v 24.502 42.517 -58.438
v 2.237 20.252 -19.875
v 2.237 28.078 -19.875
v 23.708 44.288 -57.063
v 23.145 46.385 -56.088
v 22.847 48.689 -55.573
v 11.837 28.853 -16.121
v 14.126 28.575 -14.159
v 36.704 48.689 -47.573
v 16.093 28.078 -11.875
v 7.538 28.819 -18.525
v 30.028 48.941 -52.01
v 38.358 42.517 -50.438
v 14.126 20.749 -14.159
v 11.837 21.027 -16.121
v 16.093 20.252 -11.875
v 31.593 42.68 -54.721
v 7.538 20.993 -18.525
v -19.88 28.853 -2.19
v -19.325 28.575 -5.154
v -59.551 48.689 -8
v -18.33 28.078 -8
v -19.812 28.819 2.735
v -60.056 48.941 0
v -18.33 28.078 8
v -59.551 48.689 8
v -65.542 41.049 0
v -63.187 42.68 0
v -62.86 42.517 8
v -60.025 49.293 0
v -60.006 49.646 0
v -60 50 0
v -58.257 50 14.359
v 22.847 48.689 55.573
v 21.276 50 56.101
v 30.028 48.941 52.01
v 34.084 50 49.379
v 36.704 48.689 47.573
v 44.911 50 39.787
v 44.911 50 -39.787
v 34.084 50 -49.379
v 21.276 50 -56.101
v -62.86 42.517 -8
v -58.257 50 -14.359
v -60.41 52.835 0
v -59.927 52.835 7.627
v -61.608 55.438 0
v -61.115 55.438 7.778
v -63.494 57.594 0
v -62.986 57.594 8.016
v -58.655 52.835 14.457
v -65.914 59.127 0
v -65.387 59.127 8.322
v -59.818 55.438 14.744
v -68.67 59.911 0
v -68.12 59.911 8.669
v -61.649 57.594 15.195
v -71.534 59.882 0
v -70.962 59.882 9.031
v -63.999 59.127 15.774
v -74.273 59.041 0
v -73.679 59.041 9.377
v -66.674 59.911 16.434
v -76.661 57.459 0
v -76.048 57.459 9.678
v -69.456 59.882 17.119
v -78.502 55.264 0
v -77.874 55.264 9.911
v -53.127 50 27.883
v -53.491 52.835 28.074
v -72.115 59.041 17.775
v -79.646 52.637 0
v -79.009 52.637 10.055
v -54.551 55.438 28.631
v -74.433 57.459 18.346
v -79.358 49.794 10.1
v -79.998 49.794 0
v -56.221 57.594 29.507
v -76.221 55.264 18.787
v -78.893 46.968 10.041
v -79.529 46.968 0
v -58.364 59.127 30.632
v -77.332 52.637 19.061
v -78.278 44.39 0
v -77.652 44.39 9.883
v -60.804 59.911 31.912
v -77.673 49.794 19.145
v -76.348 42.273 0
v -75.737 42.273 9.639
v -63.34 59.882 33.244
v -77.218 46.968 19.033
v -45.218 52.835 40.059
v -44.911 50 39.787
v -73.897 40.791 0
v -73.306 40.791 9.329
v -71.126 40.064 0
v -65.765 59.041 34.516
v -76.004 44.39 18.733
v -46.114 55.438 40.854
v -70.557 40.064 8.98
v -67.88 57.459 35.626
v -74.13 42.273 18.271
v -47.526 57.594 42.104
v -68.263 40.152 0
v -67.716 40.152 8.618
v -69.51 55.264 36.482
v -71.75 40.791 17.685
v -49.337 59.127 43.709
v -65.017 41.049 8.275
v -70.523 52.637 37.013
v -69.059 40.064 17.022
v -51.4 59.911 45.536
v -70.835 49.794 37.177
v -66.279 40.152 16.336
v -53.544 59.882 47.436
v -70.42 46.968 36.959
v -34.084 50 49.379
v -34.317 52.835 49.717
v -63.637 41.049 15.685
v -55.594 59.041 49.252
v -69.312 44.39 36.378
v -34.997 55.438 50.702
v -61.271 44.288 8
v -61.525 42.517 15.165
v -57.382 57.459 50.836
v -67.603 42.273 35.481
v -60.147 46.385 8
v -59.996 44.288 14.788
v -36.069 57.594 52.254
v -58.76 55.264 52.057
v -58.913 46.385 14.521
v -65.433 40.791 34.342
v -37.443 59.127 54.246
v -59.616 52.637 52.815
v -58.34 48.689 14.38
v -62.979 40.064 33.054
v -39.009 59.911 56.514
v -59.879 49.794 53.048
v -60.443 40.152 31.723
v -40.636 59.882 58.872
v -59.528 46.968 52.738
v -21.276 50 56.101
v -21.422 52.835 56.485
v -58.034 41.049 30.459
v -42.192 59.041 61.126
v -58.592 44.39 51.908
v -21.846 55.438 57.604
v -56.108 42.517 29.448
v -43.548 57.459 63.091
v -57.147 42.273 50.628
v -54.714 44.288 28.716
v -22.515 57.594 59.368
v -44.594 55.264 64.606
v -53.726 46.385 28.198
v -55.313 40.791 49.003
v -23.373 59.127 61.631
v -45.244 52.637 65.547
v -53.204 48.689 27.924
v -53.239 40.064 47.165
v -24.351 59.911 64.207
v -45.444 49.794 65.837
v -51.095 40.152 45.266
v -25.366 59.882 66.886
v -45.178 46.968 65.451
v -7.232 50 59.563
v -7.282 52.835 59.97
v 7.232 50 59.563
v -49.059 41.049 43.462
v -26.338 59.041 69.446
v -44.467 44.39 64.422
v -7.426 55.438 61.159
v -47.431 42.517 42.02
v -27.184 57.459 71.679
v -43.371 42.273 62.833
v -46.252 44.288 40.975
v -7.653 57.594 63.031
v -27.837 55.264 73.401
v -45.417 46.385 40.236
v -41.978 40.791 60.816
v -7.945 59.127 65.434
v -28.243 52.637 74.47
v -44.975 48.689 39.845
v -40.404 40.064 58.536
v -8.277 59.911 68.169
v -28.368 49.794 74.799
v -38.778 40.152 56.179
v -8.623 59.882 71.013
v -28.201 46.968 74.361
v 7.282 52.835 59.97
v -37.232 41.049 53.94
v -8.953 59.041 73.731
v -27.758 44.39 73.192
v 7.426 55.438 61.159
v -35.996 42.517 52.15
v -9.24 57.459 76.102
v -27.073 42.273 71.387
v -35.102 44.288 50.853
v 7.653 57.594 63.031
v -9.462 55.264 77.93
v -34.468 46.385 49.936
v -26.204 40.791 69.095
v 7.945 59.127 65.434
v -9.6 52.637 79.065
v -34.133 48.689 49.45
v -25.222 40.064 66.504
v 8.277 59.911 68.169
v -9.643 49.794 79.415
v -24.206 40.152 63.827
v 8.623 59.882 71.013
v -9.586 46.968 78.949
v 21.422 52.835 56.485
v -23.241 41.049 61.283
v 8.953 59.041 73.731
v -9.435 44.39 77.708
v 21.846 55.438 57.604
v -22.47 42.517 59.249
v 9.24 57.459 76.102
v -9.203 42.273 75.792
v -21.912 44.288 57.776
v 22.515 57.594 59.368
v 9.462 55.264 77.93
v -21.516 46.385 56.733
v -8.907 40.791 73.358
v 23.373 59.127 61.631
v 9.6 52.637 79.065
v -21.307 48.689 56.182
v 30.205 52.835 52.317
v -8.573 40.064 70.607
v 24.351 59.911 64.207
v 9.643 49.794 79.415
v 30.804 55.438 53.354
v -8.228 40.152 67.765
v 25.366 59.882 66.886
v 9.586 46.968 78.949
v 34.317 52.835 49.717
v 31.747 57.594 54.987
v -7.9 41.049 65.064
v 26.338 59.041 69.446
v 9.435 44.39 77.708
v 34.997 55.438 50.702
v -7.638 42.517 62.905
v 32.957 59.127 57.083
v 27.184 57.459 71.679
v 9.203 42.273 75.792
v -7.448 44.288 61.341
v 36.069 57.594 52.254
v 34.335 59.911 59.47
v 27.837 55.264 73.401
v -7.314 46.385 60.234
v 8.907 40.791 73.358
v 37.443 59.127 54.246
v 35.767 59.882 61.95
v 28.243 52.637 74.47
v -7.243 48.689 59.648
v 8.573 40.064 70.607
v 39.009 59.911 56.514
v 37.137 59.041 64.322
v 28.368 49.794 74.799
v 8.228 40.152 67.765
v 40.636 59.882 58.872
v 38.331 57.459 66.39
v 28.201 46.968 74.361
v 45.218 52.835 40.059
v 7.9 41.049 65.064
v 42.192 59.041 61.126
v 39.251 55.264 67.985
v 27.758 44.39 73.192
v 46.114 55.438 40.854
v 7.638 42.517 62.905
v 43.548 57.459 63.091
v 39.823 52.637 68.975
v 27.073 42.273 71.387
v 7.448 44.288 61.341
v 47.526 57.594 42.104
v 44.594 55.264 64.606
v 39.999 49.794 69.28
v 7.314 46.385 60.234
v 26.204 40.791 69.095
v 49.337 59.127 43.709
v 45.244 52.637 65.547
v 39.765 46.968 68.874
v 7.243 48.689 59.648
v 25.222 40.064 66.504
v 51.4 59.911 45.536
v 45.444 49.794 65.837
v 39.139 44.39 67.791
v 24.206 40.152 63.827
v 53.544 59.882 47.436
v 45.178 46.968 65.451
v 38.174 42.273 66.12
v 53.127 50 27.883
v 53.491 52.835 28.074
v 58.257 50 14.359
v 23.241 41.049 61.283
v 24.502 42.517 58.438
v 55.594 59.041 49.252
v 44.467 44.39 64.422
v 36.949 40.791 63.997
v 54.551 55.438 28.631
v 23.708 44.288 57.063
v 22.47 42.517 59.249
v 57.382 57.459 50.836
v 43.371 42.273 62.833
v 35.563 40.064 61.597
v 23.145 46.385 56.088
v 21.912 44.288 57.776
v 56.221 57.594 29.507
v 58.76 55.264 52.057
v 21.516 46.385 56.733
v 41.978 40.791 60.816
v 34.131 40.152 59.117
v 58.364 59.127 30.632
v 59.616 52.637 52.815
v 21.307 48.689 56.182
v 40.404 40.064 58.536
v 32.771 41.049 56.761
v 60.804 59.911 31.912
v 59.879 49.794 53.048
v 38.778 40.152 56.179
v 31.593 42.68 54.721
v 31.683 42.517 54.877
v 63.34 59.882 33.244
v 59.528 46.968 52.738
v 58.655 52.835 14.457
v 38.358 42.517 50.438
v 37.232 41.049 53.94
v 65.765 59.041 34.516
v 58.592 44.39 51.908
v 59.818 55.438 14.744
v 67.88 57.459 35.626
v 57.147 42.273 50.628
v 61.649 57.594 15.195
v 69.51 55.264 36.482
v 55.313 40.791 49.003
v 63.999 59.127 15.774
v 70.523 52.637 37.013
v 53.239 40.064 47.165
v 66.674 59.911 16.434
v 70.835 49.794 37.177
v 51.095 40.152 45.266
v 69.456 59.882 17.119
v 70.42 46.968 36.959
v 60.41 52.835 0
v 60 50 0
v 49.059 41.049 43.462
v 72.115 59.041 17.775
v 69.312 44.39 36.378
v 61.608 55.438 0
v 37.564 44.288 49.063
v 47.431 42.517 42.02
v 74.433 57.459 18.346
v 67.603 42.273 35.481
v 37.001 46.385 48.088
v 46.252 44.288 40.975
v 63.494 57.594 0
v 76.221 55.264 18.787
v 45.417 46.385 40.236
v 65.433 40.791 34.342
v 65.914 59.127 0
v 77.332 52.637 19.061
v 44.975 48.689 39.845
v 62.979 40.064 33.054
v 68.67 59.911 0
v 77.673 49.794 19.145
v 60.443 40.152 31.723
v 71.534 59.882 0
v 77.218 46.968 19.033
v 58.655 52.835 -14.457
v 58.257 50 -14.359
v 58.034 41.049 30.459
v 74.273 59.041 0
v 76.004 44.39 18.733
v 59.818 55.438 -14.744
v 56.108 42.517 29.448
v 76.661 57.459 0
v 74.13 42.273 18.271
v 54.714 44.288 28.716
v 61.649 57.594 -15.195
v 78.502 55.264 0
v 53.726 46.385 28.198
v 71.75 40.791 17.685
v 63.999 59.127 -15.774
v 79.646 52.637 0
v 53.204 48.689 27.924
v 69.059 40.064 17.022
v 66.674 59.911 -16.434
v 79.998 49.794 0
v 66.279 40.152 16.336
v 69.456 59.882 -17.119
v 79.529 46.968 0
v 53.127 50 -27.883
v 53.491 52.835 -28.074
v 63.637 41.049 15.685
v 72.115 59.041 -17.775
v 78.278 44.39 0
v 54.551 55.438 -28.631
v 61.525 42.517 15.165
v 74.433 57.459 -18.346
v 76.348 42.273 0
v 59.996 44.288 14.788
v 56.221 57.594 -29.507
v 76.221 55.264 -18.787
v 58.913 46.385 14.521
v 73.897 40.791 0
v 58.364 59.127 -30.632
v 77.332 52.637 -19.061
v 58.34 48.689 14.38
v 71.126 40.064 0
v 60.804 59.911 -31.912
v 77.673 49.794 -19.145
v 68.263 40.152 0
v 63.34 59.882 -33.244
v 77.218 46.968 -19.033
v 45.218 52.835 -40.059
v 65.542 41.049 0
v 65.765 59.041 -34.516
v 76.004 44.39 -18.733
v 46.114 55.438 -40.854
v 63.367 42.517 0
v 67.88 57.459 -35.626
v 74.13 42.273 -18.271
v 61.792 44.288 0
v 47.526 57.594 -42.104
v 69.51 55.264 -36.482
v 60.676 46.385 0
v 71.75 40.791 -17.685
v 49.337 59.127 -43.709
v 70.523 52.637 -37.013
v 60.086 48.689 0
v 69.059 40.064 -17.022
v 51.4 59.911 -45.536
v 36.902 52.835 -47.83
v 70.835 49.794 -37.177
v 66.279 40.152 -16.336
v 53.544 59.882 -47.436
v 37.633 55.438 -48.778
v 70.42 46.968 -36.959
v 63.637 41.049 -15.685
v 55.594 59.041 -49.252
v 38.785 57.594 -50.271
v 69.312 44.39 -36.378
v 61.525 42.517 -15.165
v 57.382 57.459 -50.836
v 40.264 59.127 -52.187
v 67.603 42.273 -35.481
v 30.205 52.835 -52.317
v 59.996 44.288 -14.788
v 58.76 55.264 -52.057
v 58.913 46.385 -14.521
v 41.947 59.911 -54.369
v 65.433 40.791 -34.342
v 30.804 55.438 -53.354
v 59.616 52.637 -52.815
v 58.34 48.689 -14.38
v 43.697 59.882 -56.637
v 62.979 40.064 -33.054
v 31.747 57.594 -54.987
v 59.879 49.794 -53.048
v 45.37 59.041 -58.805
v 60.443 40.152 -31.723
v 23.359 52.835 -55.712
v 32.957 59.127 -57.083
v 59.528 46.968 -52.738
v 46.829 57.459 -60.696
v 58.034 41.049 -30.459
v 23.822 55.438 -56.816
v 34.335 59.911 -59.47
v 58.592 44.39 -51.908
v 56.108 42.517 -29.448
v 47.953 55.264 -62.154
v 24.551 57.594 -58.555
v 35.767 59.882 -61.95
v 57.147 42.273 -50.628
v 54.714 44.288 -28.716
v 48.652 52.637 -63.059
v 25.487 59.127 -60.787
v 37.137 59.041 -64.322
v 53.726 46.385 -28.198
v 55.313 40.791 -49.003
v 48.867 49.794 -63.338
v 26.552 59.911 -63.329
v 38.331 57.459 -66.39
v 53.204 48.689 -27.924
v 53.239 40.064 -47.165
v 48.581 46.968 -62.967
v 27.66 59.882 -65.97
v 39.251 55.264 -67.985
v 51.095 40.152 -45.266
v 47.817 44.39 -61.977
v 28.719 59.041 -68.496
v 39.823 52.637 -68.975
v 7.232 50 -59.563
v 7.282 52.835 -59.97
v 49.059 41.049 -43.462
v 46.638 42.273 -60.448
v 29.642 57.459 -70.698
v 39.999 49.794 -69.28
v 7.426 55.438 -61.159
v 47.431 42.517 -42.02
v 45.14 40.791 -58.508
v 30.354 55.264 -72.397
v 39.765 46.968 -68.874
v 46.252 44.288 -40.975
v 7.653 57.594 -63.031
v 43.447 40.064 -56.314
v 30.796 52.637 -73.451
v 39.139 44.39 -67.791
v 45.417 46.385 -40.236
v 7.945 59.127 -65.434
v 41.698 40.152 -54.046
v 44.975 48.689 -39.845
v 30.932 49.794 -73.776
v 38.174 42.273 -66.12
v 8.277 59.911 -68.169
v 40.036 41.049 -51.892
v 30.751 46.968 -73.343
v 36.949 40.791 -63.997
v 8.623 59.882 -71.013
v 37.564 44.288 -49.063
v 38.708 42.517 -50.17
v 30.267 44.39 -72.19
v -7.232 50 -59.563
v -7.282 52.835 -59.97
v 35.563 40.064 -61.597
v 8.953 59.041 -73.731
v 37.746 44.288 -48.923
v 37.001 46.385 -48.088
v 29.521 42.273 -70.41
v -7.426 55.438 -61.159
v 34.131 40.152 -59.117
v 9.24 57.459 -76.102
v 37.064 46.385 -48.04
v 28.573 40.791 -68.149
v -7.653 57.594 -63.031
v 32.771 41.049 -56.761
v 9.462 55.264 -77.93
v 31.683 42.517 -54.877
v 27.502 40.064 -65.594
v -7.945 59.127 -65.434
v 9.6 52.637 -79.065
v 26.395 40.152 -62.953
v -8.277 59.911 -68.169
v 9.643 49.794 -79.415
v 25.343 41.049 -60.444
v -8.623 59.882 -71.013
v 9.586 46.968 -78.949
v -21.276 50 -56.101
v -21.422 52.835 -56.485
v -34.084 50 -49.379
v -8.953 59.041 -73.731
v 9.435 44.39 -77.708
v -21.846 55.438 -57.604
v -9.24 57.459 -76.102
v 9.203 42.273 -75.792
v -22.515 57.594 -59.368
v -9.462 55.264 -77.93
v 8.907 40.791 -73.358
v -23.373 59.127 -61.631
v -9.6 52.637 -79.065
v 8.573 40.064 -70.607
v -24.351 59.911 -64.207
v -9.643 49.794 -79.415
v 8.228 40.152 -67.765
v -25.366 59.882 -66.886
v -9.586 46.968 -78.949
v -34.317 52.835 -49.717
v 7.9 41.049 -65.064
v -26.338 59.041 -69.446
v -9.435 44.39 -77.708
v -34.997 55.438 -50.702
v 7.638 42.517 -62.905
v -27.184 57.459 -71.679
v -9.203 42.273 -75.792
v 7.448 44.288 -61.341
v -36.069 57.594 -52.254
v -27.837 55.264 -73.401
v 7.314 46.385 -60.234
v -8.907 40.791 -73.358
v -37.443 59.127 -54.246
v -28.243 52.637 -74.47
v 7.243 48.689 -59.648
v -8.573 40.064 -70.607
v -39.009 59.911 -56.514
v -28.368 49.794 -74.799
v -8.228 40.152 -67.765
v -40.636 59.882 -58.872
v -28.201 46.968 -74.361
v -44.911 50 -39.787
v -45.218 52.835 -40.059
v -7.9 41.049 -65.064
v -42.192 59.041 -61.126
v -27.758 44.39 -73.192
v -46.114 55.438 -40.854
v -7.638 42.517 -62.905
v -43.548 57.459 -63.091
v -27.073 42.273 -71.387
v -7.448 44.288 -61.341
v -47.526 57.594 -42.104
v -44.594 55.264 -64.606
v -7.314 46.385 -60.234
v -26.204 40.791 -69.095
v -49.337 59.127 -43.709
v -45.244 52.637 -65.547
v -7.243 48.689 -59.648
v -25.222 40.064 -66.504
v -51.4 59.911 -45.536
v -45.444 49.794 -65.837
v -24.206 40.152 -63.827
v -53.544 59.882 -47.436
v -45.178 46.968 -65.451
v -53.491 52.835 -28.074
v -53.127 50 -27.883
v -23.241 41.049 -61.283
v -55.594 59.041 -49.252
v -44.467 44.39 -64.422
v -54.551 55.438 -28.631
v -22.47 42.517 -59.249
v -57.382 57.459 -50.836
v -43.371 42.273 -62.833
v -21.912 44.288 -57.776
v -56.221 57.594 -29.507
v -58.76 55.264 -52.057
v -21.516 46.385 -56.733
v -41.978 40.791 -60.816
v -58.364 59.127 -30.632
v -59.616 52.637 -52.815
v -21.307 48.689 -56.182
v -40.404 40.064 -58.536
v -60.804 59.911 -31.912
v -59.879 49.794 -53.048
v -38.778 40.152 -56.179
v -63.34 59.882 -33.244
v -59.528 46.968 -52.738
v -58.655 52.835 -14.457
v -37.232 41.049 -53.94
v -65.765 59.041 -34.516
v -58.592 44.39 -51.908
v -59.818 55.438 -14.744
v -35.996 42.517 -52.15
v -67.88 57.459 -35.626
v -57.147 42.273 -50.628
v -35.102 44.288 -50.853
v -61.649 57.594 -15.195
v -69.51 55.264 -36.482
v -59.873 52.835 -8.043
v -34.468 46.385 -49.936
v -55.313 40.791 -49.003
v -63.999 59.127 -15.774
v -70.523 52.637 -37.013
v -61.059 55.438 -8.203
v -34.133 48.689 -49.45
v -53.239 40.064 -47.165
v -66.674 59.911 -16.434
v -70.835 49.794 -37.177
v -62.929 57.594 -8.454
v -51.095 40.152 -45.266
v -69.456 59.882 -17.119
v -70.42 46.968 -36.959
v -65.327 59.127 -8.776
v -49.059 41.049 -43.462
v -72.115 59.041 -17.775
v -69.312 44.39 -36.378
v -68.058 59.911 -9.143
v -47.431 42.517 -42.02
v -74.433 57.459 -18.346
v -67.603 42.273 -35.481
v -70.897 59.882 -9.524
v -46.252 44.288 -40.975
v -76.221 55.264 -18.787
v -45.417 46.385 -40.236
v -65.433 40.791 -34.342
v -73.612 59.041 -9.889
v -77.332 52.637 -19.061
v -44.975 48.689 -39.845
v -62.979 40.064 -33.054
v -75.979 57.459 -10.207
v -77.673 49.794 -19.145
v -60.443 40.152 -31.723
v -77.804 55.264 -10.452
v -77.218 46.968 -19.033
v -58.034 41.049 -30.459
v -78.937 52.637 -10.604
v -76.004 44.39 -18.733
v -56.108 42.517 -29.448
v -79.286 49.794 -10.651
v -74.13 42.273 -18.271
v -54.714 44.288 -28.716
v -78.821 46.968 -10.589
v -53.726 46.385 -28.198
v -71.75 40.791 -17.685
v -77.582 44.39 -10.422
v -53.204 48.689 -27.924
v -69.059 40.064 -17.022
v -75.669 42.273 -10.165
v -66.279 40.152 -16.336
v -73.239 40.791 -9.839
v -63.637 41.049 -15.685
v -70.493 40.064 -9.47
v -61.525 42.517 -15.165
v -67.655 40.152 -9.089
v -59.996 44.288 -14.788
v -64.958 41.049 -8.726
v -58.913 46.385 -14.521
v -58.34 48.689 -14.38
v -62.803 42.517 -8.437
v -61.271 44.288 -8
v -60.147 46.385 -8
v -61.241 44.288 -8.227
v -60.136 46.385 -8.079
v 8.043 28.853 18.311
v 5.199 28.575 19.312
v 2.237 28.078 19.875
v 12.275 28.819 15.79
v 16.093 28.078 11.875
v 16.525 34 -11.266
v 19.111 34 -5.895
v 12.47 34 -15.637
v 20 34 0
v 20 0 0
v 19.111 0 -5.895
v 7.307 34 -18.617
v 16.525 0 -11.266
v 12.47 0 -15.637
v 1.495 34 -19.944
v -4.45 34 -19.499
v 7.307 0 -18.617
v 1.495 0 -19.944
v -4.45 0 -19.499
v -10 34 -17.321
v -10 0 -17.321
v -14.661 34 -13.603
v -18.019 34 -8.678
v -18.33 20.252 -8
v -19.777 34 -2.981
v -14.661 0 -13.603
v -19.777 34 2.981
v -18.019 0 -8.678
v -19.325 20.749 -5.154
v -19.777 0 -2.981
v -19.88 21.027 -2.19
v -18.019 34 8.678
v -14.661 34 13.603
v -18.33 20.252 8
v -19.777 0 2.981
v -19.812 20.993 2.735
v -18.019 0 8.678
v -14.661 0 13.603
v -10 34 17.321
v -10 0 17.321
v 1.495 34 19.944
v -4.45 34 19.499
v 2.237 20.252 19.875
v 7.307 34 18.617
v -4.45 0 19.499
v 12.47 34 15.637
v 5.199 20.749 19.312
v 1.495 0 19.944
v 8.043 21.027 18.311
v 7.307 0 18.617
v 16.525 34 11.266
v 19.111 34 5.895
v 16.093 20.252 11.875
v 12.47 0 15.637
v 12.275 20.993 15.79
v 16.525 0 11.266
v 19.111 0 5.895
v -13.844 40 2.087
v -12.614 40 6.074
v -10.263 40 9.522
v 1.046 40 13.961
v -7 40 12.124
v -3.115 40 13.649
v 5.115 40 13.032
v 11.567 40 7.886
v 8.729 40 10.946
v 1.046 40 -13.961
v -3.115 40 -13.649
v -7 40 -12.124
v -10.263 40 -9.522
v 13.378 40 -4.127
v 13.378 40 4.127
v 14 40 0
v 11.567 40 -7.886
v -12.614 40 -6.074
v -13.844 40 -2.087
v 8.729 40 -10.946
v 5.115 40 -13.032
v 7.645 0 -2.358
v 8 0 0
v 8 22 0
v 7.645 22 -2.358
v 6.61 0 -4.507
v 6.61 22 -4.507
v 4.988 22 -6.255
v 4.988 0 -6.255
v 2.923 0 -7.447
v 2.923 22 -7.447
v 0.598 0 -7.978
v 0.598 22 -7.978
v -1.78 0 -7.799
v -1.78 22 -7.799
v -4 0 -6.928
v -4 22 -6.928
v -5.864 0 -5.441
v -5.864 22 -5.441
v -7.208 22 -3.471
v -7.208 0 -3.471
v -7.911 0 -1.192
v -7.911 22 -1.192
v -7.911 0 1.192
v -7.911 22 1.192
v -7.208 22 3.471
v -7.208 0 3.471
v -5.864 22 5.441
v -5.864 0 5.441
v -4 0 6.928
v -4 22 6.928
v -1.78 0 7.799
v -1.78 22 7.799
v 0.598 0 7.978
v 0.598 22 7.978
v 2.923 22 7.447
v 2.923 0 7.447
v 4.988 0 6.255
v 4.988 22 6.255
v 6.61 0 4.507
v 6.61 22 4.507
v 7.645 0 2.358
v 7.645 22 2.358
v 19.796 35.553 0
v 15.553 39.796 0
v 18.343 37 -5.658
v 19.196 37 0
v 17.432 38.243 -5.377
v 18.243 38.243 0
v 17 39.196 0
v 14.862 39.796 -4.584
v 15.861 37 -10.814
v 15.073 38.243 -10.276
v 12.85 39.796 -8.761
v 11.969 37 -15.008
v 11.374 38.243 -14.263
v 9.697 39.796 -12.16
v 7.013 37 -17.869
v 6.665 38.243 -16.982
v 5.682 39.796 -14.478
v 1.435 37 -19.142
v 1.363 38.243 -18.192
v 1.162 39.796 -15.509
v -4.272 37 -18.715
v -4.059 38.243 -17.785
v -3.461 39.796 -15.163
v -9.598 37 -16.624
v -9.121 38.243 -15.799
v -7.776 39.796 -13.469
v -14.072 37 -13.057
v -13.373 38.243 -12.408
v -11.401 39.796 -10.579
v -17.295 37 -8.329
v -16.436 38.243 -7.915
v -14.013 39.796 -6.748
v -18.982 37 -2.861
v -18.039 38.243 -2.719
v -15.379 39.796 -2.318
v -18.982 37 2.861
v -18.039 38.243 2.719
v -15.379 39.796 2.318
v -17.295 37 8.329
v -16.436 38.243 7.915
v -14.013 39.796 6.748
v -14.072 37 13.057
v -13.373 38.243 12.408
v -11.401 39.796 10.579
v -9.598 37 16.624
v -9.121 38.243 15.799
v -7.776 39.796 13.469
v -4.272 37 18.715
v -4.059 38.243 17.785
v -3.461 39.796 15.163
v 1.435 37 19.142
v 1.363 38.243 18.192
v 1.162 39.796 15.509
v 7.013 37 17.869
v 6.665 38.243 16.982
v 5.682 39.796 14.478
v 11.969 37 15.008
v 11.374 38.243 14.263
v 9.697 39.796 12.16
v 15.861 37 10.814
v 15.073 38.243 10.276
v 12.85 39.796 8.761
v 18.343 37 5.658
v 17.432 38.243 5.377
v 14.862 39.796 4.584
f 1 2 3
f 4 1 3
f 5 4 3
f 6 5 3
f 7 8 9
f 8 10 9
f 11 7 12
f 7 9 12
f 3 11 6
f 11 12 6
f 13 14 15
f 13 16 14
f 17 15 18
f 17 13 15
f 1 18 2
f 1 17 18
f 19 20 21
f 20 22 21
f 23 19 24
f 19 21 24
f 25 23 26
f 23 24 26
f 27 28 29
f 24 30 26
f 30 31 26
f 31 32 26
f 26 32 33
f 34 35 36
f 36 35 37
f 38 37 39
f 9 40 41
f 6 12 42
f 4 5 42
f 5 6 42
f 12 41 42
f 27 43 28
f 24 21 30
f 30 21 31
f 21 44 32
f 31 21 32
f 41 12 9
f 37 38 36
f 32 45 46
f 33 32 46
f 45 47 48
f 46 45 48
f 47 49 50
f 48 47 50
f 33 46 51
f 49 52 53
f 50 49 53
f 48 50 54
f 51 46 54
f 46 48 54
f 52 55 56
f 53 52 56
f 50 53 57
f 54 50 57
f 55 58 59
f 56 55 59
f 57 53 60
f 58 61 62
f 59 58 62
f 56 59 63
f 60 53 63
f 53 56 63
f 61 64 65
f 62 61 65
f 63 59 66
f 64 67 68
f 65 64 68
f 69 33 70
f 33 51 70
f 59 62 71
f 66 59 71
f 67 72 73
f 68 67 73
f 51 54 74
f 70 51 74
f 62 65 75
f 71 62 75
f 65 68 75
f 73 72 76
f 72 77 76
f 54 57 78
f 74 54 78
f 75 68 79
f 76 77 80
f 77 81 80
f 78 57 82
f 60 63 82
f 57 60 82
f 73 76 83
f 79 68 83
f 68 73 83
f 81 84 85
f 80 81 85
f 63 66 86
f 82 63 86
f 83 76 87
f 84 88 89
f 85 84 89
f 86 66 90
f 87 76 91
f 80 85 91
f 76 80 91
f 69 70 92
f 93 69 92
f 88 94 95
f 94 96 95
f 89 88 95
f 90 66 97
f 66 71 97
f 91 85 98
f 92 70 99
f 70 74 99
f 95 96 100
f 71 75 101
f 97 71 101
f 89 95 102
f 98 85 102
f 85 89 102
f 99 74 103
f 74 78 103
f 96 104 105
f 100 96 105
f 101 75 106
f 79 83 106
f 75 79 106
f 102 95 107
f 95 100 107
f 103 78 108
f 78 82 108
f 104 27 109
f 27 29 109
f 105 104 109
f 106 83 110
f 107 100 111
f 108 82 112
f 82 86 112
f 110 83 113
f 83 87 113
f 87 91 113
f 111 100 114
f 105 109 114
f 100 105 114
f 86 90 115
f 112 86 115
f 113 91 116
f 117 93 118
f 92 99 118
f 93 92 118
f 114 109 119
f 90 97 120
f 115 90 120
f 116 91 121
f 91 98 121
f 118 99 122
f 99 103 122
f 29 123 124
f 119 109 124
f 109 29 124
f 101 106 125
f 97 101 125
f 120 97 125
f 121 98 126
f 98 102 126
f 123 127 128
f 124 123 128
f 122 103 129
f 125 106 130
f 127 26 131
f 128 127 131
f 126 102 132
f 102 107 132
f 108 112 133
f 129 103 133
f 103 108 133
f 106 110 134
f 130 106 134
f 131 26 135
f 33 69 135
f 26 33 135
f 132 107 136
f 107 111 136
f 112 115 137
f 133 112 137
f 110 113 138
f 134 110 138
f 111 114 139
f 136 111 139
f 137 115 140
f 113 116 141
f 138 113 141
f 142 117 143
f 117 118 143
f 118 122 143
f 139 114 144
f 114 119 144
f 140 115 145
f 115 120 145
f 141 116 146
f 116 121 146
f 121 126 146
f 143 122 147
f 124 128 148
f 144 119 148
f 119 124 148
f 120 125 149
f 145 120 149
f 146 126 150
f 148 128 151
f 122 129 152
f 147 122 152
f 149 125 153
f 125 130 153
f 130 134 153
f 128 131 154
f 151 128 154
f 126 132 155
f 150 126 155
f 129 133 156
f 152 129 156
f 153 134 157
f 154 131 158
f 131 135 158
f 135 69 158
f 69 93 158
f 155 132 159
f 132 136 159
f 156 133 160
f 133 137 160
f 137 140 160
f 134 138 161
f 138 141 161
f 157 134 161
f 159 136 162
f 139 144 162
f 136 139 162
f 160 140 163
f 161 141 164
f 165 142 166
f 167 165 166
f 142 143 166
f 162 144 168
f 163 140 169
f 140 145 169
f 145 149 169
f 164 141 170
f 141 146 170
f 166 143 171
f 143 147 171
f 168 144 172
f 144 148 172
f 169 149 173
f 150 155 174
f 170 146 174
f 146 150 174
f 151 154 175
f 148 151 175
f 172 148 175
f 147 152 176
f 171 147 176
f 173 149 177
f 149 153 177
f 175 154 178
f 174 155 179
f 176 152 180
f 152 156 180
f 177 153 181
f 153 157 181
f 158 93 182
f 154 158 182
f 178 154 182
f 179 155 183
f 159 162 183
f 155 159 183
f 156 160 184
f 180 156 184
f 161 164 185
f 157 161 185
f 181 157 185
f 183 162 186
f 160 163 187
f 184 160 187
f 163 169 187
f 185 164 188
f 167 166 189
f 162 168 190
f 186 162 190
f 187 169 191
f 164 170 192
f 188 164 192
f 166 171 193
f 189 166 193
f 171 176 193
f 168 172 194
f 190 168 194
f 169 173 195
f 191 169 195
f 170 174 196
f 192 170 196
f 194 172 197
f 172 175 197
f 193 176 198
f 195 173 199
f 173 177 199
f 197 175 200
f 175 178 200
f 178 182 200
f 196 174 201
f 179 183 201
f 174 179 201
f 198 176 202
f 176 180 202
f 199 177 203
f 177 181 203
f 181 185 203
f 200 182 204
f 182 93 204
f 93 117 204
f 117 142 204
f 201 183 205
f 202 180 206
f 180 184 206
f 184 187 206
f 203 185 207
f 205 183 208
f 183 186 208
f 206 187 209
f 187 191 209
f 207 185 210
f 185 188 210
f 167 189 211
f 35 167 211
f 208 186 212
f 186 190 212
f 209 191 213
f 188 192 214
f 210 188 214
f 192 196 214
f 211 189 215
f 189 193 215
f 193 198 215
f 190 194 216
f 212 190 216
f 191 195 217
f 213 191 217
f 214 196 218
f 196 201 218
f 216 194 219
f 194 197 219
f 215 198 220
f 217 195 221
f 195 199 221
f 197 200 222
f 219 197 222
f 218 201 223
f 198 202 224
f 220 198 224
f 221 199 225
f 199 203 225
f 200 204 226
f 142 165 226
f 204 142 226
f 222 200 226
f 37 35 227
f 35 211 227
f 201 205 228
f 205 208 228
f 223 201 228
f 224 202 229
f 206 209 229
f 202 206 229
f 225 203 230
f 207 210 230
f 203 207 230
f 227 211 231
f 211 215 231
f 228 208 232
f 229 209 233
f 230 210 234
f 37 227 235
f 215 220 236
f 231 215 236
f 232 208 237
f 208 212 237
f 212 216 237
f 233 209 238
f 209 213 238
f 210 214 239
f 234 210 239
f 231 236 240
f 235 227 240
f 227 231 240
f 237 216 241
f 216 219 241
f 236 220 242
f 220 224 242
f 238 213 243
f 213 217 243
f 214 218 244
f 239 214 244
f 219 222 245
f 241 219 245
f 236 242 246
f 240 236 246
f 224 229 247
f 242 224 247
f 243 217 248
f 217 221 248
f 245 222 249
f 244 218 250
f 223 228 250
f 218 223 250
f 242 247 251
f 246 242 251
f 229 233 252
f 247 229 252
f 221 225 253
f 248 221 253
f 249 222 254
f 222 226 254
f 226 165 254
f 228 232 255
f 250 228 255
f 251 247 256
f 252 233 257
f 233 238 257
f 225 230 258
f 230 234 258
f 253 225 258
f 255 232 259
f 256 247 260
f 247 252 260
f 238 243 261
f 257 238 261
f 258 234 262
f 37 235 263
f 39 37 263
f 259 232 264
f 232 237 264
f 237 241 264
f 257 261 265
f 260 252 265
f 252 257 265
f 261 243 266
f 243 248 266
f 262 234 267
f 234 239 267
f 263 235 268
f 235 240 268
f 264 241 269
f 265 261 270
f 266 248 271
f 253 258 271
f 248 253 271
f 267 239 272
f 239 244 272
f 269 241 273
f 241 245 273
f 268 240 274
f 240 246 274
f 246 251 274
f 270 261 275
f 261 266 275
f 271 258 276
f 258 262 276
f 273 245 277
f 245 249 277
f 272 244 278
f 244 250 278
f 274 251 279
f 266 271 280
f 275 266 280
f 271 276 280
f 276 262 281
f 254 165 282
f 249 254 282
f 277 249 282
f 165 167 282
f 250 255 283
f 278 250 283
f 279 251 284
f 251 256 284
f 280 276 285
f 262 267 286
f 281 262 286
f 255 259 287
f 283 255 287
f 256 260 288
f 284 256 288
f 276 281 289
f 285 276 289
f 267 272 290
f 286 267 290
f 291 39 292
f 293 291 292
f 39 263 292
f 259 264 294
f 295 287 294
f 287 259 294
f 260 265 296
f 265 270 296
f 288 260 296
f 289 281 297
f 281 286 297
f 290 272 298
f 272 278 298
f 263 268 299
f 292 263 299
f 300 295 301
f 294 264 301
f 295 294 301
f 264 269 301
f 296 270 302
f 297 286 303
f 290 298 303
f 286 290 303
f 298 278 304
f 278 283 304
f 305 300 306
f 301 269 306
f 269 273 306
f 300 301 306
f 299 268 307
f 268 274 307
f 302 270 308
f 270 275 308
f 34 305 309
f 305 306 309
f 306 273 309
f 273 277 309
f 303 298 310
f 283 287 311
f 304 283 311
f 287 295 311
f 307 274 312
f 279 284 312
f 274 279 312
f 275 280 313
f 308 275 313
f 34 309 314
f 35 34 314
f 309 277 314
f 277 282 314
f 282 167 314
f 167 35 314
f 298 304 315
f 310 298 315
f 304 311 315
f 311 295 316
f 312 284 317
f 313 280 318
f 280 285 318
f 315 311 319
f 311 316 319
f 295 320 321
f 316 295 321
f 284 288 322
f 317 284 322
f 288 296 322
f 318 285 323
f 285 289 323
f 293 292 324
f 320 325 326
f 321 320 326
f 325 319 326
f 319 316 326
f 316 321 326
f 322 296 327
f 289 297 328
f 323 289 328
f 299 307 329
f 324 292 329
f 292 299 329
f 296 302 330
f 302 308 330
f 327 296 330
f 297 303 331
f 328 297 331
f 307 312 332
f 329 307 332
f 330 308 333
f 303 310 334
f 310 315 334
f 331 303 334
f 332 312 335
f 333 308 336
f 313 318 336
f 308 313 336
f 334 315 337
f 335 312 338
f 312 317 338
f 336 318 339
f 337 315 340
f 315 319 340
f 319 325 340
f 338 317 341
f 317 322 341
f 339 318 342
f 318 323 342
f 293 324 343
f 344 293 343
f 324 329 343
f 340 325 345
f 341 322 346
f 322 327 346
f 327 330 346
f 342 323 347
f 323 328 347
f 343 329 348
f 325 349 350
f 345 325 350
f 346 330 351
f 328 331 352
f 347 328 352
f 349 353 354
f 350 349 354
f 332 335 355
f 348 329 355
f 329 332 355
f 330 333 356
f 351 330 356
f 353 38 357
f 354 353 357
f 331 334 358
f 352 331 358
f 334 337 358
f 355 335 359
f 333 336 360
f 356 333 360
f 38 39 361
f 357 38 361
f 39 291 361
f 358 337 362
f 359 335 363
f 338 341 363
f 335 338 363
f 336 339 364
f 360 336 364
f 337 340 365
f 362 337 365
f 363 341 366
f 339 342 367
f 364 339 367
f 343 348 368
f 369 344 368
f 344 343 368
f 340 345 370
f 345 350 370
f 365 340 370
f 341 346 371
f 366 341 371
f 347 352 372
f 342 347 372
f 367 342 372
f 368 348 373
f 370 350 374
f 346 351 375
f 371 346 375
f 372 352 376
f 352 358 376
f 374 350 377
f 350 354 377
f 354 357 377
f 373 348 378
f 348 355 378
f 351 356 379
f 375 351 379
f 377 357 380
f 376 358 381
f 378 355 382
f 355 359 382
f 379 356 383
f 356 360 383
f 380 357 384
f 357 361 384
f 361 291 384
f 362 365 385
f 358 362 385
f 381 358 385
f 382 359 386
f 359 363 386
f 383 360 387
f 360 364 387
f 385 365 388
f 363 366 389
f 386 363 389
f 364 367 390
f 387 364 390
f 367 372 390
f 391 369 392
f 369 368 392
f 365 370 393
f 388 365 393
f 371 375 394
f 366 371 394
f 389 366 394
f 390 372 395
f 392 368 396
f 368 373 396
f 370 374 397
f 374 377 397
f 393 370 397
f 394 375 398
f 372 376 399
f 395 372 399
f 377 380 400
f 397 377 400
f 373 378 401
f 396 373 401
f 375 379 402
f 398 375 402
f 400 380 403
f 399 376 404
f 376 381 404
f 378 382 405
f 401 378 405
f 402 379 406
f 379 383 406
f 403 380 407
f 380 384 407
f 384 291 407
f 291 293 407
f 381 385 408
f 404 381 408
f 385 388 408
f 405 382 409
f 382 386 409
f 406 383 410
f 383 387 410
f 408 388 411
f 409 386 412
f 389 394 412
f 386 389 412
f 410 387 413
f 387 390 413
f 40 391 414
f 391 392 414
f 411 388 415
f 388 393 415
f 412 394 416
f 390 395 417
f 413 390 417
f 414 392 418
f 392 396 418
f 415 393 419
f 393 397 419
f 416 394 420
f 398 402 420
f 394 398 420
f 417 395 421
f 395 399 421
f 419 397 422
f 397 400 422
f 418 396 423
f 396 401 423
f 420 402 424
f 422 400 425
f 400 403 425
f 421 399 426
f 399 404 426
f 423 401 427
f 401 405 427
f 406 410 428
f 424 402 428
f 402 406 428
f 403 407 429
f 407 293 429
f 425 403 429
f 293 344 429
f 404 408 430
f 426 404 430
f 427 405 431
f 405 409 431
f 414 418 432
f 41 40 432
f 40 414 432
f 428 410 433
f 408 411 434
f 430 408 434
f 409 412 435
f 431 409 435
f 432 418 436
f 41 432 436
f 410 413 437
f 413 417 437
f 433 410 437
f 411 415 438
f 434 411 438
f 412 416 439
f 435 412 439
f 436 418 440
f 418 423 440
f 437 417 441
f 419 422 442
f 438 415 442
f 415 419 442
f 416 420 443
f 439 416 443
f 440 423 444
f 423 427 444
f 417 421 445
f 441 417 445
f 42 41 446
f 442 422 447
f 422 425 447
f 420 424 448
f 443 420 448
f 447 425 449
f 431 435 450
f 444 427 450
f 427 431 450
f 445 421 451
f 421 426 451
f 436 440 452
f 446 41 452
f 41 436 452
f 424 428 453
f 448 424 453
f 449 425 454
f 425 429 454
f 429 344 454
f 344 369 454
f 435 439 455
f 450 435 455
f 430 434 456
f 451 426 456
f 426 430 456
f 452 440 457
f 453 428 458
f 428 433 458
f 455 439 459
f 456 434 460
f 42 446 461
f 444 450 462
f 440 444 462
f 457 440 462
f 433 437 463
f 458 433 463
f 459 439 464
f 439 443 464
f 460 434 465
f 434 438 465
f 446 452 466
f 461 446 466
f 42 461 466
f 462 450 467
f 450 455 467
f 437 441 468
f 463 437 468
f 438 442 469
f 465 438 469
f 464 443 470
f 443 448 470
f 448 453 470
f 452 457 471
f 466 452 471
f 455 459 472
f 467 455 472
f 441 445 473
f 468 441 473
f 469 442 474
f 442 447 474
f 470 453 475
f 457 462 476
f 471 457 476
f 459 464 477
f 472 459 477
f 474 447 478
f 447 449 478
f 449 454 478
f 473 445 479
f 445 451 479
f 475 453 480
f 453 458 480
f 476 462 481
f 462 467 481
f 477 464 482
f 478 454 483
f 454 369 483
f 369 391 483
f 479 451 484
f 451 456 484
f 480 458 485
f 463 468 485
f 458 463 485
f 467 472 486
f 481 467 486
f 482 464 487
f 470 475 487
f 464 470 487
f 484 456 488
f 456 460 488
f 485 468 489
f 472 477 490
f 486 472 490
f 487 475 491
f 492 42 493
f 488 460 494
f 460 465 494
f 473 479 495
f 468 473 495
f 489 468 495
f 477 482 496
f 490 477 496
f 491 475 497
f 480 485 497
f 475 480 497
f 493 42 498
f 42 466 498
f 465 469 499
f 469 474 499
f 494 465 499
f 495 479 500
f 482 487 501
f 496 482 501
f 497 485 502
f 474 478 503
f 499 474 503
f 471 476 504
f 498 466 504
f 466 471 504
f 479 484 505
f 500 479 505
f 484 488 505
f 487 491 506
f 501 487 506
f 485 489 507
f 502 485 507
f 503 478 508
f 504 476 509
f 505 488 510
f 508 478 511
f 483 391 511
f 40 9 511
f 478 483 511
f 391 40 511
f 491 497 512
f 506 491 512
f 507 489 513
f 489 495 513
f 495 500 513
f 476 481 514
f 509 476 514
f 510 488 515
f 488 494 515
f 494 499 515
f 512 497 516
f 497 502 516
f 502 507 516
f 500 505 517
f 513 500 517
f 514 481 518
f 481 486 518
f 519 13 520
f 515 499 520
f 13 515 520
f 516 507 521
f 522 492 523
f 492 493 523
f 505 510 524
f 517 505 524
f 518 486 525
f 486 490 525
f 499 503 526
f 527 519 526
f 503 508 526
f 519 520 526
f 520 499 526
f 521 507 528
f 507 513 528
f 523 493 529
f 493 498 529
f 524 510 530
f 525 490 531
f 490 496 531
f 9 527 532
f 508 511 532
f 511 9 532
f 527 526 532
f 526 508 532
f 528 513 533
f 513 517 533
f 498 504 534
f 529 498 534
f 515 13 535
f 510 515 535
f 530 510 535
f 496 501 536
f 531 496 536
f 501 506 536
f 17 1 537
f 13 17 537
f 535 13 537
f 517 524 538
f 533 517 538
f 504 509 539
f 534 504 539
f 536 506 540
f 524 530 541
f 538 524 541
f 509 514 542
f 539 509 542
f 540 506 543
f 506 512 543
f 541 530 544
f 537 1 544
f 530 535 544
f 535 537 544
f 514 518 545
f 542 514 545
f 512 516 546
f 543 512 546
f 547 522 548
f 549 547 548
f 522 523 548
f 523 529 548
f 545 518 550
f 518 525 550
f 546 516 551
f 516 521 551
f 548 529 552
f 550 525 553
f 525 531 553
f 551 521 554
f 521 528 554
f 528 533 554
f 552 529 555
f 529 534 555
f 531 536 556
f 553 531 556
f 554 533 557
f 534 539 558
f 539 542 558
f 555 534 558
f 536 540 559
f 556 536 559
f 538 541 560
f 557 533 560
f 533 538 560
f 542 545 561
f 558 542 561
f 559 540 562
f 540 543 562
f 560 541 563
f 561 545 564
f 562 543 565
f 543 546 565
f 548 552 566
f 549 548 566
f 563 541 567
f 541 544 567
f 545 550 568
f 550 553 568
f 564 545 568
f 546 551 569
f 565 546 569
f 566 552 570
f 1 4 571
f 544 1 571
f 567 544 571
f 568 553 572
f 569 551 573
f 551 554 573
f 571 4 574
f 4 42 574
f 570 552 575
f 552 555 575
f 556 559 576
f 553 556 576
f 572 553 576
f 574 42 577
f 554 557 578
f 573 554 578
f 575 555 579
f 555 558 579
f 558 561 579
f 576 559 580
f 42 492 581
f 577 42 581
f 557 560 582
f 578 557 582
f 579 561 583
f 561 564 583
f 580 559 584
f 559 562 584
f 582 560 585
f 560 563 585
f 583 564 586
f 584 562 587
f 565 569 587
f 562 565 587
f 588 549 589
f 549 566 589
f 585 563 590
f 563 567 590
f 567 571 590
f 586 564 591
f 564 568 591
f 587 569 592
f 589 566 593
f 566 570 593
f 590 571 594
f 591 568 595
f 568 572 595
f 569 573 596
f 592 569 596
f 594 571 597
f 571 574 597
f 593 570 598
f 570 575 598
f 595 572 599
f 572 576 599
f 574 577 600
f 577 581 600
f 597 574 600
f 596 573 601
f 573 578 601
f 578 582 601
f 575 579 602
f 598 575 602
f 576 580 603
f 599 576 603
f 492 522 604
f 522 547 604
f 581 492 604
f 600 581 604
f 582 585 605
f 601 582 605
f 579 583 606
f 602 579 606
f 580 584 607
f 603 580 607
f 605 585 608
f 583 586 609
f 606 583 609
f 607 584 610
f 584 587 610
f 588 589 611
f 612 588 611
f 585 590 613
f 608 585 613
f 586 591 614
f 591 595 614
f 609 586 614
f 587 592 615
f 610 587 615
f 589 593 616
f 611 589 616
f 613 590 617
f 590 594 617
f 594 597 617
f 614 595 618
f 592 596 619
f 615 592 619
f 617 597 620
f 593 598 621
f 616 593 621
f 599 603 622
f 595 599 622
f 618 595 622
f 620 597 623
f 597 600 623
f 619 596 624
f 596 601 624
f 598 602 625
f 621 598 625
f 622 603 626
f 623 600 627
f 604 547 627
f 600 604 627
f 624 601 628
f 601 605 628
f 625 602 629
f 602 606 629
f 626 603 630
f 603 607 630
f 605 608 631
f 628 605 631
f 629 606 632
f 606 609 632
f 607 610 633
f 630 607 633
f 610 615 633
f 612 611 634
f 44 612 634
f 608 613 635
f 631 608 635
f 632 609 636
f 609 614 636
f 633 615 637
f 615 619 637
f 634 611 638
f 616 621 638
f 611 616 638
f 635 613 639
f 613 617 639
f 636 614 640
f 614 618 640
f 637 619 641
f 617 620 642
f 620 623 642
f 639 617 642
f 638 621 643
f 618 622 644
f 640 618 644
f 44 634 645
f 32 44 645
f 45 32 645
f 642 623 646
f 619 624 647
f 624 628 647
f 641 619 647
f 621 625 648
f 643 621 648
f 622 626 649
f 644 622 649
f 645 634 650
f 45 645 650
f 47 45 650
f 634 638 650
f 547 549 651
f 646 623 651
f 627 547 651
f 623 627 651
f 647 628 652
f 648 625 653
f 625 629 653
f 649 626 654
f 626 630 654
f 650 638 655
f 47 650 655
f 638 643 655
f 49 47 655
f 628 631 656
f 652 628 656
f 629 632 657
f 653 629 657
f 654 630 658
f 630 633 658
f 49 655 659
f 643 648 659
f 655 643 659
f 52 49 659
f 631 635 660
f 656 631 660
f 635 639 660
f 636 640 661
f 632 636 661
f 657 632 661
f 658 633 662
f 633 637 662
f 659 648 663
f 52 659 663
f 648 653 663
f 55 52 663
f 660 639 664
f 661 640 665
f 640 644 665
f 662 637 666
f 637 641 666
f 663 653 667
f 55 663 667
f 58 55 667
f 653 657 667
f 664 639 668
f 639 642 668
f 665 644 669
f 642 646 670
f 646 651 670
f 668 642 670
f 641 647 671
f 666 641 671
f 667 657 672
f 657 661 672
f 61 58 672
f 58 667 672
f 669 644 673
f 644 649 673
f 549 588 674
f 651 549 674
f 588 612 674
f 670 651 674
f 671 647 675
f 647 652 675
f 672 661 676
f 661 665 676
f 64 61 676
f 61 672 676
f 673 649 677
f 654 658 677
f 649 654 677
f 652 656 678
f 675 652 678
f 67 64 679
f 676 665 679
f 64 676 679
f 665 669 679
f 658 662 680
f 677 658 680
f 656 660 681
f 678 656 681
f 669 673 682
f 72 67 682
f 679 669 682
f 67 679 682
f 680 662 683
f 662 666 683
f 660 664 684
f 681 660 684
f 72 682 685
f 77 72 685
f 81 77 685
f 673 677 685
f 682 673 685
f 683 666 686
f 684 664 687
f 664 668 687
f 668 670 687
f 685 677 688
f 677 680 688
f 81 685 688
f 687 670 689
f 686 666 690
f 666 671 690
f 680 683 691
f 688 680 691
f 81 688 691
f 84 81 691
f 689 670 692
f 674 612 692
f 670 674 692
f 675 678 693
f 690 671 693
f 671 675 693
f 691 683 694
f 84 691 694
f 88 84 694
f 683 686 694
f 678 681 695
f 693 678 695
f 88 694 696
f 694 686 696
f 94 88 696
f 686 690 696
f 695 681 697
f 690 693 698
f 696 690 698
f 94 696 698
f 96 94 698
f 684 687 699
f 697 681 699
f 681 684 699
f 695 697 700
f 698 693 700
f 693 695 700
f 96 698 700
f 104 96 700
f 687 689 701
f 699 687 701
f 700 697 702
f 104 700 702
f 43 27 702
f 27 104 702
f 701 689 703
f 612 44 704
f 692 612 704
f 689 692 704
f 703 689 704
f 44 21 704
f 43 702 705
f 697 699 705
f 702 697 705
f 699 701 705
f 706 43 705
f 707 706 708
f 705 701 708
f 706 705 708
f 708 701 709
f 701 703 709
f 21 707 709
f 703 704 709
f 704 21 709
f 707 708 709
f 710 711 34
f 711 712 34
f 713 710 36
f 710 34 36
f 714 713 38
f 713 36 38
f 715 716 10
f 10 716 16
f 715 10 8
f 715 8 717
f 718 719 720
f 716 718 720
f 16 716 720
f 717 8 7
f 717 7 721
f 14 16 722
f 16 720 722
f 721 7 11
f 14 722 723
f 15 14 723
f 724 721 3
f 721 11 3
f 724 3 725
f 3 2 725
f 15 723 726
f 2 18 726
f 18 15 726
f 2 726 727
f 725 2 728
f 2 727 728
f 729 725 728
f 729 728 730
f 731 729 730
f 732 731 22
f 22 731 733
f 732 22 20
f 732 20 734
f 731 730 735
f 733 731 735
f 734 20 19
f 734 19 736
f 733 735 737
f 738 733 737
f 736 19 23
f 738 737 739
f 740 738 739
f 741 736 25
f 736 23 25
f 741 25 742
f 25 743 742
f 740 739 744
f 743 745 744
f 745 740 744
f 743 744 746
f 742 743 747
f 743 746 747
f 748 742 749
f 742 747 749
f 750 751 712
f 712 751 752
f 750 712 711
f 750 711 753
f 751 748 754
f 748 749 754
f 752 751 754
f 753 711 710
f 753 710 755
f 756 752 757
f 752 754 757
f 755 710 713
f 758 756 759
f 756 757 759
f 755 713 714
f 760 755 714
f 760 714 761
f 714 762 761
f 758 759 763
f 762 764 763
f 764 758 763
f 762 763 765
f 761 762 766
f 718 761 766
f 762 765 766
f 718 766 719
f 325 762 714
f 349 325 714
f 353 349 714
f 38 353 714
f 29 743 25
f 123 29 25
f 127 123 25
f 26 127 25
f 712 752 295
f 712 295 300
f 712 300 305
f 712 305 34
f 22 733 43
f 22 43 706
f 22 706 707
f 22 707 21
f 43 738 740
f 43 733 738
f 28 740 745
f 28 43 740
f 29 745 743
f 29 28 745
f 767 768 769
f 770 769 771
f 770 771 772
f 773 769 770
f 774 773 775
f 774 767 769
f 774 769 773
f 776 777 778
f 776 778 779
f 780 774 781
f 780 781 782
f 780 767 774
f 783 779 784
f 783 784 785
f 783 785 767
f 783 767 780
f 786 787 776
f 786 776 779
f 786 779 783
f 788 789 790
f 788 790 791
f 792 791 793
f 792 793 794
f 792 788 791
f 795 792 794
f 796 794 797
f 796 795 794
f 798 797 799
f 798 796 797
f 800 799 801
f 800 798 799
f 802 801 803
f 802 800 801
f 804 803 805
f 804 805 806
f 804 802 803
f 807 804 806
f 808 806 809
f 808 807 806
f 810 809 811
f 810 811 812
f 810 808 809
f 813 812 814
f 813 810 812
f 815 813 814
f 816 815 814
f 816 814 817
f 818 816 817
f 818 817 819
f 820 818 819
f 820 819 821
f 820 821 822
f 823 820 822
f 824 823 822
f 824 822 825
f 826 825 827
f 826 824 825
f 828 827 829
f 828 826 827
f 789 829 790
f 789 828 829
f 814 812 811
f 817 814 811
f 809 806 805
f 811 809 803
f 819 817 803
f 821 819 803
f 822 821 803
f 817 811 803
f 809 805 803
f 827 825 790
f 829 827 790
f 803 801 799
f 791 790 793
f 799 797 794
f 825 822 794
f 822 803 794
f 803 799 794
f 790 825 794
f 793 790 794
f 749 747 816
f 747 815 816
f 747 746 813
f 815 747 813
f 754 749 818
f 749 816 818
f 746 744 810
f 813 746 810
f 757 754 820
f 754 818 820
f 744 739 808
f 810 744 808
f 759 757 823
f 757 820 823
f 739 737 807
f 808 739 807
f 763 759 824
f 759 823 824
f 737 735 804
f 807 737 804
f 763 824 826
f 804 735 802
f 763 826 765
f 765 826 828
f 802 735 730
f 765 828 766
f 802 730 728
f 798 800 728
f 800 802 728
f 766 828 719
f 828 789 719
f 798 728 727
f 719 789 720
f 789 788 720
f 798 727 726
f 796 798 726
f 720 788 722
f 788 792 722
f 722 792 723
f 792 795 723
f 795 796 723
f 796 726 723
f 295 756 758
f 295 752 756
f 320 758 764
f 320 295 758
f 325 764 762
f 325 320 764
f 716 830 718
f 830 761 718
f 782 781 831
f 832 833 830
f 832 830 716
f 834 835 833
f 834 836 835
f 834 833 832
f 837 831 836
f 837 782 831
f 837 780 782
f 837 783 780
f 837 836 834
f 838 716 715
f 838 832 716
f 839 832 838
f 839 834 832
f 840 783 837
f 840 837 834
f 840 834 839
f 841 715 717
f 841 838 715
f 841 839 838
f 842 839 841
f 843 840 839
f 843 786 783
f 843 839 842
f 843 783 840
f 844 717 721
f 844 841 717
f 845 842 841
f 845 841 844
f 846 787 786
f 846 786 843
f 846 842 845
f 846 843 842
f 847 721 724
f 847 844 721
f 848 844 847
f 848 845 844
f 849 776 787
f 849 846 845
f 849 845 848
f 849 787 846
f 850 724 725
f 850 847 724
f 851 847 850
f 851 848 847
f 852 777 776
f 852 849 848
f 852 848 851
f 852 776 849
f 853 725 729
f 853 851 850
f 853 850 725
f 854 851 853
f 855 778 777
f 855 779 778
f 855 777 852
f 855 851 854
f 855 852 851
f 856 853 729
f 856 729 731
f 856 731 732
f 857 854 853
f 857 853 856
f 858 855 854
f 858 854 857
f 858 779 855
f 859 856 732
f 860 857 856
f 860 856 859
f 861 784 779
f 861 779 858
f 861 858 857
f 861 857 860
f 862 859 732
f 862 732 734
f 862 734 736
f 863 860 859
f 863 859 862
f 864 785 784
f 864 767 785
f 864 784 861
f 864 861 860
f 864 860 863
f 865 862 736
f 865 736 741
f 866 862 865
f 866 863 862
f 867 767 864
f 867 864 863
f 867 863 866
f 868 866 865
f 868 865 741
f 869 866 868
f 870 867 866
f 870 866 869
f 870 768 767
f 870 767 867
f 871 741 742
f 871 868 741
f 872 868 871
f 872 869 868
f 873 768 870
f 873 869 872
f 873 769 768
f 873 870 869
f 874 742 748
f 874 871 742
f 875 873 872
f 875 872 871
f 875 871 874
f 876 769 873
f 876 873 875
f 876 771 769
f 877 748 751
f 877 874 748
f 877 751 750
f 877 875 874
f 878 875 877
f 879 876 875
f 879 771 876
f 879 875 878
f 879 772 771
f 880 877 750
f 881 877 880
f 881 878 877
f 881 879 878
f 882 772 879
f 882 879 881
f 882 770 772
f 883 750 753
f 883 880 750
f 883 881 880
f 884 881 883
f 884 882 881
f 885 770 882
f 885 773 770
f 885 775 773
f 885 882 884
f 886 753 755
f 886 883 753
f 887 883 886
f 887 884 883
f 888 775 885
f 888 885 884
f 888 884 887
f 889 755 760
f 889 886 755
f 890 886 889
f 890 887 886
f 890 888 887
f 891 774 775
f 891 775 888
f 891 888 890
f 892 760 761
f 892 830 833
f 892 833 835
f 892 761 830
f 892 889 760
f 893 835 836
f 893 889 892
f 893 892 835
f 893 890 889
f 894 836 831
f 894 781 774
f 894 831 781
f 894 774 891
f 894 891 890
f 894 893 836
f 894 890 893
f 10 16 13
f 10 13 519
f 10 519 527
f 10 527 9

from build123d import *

# Parameters (mm, degrees)
SKETCH1_R                = 20
BOSS_EXTRUDE1_DEPTH      = 40
SKETCH1_7_R              = 8
CUT_EXTRUDE4_DEPTH       = 22
SKETCH3_R                = 10
BOSS_EXTRUDE2_REACH      = 179.2
BOSS_EXTRUDE2_END_RADIUS = 20
SKETCH6_W                = 16
SKETCH6_H                = 7
CIRPATTERN1_COUNT        = 3
FILLET1_R                = 6


with BuildPart() as part:
    # Sketch1 → Boss-Extrude1 (new body)
    with BuildSketch(Plane(origin=(0, 0, 0), x_dir=(1, 0, 0), z_dir=(0, 1, 0))):
        Circle(SKETCH1_R)
    extrude(amount=BOSS_EXTRUDE1_DEPTH)

    # Sketch1<7> → Cut-Extrude4 (cut)
    with BuildSketch(Plane(origin=(0, 0, 0), x_dir=(1, 0, 0), z_dir=(0, 1, 0))):
        Circle(SKETCH1_7_R)
    extrude(amount=CUT_EXTRUDE4_DEPTH, mode=Mode.SUBTRACT)



with BuildPart() as body_2:
    # Sketch3 → Revolve1 (revolve)
    with BuildSketch(Plane.XY):
        with Locations((-70, 50)):
            Circle(SKETCH3_R)
    revolve(axis=Axis((0, 40, 0), (0, 1, 0)))


with BuildPart() as part_1:
    add(part.part)

    add(body_2.part)  # Boss-Extrude2 merges body 2
    # Boss-Extrude2: up to this cylinder (the profile starts outside it)
    boss_extrude2_end = Plane(origin=(0, 50, 0), z_dir=(0, -1, 0)) * Cylinder(BOSS_EXTRUDE2_END_RADIUS, 399.4, mode=Mode.PRIVATE)
    # Sketch6 → Boss-Extrude2 (add, up to the surface)
    with BuildSketch(Plane(origin=(-70, 50, 0), x_dir=(0, 0, 1), z_dir=(-0.8944271909999159, 0.44721359549995815, 0)), mode=Mode.PRIVATE) as boss_extrude2_sk1:
        Rectangle(SKETCH6_W, SKETCH6_H)
    boss_extrude2_tool1 = extrude(boss_extrude2_sk1.sketch, amount=-BOSS_EXTRUDE2_REACH, mode=Mode.PRIVATE) - boss_extrude2_end
    boss_extrude2 = boss_extrude2_tool1.solids().sort_by_distance((-70, 50, 0))[0]
    add(boss_extrude2)

    # CirPattern1: Boss-Extrude2 ×3 about axis
    cirpattern1_axis = Axis((0, 40, 0), (0, 1, 0))
    for i in range(1, CIRPATTERN1_COUNT):
        add(boss_extrude2.rotate(cirpattern1_axis, i * 360 / CIRPATTERN1_COUNT))

    # Fillet1
    fillet1_edges = [part_1.edges().sort_by_distance(p)[0] for p in [
        (-20, 40, 0),
    ]]
    fillet(fillet1_edges, radius=FILLET1_R)


solid = part_1.part
